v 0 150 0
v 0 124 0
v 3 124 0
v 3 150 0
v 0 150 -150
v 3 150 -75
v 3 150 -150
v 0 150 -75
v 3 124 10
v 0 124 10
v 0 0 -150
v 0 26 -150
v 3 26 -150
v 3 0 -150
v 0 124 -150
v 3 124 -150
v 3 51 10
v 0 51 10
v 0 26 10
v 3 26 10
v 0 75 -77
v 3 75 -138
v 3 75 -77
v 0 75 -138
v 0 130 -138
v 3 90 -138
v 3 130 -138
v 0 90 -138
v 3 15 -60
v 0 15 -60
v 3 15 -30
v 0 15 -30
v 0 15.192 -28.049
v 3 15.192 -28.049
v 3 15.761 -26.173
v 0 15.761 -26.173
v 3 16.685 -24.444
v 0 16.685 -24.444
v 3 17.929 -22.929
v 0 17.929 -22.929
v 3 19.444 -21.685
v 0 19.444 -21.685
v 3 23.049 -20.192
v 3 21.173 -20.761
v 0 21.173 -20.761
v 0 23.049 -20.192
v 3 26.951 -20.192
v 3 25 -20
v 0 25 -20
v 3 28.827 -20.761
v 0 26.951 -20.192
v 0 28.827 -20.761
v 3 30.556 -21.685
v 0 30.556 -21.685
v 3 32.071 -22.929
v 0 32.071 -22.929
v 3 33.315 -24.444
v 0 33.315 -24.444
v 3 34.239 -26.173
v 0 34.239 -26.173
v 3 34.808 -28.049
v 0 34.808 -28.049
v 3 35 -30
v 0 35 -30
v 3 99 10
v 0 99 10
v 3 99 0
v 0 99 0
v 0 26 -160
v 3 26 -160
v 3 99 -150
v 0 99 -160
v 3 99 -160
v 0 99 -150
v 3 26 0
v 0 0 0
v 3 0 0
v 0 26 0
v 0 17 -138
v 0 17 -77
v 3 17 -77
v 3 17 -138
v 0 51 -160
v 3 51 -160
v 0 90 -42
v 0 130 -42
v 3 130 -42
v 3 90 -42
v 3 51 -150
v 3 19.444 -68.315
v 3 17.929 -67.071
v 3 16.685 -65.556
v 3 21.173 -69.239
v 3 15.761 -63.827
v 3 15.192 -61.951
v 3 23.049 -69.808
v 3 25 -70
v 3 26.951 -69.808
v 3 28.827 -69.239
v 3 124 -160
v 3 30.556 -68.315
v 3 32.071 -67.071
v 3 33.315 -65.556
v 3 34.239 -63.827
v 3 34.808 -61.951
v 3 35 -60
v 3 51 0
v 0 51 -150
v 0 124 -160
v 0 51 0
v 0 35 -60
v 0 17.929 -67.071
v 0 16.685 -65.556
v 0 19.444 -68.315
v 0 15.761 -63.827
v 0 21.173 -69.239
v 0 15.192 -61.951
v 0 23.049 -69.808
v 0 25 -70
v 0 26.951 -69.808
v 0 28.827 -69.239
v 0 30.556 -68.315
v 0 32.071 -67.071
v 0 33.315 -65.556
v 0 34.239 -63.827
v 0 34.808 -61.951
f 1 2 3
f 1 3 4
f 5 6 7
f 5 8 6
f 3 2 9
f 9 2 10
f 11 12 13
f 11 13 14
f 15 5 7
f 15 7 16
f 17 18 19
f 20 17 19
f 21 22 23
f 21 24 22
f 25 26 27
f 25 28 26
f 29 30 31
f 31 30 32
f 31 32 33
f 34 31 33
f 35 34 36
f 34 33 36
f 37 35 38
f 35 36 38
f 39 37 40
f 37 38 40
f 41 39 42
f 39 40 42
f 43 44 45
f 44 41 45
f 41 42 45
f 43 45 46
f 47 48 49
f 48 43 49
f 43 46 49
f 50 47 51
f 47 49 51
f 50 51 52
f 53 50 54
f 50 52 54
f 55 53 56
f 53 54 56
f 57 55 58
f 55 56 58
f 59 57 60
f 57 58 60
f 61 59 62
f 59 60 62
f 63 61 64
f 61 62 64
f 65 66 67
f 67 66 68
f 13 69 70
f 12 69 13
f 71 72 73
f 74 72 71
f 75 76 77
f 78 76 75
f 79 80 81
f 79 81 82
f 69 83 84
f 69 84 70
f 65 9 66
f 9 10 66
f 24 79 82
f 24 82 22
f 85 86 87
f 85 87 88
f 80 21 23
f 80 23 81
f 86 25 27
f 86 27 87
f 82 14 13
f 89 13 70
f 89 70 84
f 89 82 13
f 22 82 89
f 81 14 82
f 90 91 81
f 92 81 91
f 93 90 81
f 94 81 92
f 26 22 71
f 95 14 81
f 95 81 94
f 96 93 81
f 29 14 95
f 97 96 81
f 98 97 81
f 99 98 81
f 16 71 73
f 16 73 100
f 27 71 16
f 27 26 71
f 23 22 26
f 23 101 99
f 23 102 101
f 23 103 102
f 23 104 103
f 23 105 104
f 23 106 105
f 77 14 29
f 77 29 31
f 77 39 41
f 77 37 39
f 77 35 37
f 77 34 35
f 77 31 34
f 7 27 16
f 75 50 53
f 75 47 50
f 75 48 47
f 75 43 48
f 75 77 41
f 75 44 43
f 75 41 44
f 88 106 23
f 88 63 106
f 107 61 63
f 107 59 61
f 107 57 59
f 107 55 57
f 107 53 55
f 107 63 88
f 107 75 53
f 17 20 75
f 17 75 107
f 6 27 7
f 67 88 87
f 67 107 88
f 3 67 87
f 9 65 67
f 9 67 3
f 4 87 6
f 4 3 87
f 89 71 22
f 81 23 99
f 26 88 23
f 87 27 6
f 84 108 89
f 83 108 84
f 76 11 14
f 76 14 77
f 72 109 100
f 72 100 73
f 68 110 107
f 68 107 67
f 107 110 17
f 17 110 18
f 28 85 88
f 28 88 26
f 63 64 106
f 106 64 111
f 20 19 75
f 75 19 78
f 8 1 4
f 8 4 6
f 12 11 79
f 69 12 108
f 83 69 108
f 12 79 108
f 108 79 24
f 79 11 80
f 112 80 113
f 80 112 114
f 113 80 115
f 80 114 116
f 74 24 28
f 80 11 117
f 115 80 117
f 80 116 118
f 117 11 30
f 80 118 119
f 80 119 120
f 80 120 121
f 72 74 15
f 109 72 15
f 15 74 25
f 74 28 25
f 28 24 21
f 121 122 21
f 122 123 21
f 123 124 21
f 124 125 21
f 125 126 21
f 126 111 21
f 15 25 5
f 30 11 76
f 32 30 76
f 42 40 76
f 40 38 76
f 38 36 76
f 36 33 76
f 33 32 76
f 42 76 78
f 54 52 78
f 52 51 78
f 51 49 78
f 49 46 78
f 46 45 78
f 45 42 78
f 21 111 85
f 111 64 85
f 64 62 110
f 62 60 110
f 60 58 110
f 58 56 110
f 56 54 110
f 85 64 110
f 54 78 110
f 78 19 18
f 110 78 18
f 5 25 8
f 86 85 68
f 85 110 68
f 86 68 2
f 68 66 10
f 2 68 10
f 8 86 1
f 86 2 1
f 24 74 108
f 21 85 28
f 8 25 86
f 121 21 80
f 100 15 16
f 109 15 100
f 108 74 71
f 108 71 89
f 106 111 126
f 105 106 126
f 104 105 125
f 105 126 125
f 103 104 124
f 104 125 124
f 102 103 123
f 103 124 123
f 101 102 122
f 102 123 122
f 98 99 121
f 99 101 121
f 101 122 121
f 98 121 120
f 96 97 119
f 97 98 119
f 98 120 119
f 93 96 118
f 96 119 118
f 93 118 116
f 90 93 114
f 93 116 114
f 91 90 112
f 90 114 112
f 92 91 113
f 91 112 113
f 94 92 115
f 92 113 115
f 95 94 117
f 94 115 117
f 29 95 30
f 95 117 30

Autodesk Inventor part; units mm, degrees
ref_plane "YZ Plane" through (0, 0, 0) normal (1, 0, 0) x (0, 1, 0)
ref_plane "XZ Plane" through (0, 0, 0) normal (0, 1, 0) x (-1, 0, 0)
ref_plane "XY Plane" through (0, 0, 0) normal (0, 0, 1) x (1, 0, 0)
sketch "Sketch1" plane through (0, 0, 0) normal (1, 0, 0) x (0, 1, 0)
  line L0 (150, 0) -> (150, -150)
  line L1 (0, -150) -> (0, 0)
  line L2 (130, -42) -> (90, -42)
  line L3 (90, -42) -> (90, -138)
  line L4 (90, -138) -> (130, -138)
  line L5 (130, -138) -> (130, -42)
  line L6 (130, -42) -> (90, -138) construction
  line L7 (90, -42) -> (130, -138) construction
  line L8 (75, -77) -> (17, -77)
  line L9 (17, -77) -> (17, -138)
  line L10 (17, -138) -> (75, -138)
  line L11 (75, -138) -> (75, -77)
  line L12 (75, -77) -> (17, -138) construction
  line L13 (17, -77) -> (75, -138) construction
  line L14 (25, -30) -> (25, -60) construction
  line L15 (35, -30) -> (35, -60)
  line L16 (15, -60) -> (15, -30)
  arc A0 (35, -30) -> (15, -30) centre (25, -30) ccw
  arc A1 (15, -60) -> (35, -60) centre (25, -60) ccw
  line L17 (124, 0) -> (124, 10)
  line L18 (124, 10) -> (99, 10)
  line L19 (99, 10) -> (99, 0)
  line L20 (51, 0) -> (51, 10)
  line L21 (51, 10) -> (26, 10)
  line L22 (26, 10) -> (26, 0)
  line L23 (150, -75) -> (168, -75)
  line L24 (124, 0) -> (150, 0)
  line L25 (0, 0) -> (26, 0)
  line L26 (51, 0) -> (99, 0)
  line L27 (124, -150) -> (124, -160)
  line L28 (124, -160) -> (99, -160)
  line L29 (99, -160) -> (99, -150)
  line L30 (51, -150) -> (51, -160)
  line L31 (51, -160) -> (26, -160)
  line L32 (26, -160) -> (26, -150)
  line L33 (150, -150) -> (124, -150)
  line L34 (99, -150) -> (51, -150)
  line L35 (26, -150) -> (0, -150)
  point P0 (110, -90)
  point P1 (46, -107.5)
  point P2 (25, -45)
  dimension "d0" = 150
  dimension "d1" = 150
  dimension "d2" = 90
  dimension "d3" = 110
  dimension "d4" = 40
  dimension "d5" = 96
  dimension "d6" = 58
  dimension "d7" = 61
  dimension "d8" = 46
  dimension "d9" = 96
  dimension "d10" = 25
  dimension "d11" = 30
  dimension "d12" = 30
  dimension "d13" = 10
  dimension "d16" = 25
  dimension "d17" = 10
  dimension "d18" = 26
  dimension "d19" = 10
  dimension "d20" = 25
  dimension "d21" = 26
  dimension "d24" = 33
  dimension "d25" = 75
  dimension "d26" = 18
extrude "Extrusion1" add sketch "Sketch1" along normal blind 3
properties part number "front_part"
